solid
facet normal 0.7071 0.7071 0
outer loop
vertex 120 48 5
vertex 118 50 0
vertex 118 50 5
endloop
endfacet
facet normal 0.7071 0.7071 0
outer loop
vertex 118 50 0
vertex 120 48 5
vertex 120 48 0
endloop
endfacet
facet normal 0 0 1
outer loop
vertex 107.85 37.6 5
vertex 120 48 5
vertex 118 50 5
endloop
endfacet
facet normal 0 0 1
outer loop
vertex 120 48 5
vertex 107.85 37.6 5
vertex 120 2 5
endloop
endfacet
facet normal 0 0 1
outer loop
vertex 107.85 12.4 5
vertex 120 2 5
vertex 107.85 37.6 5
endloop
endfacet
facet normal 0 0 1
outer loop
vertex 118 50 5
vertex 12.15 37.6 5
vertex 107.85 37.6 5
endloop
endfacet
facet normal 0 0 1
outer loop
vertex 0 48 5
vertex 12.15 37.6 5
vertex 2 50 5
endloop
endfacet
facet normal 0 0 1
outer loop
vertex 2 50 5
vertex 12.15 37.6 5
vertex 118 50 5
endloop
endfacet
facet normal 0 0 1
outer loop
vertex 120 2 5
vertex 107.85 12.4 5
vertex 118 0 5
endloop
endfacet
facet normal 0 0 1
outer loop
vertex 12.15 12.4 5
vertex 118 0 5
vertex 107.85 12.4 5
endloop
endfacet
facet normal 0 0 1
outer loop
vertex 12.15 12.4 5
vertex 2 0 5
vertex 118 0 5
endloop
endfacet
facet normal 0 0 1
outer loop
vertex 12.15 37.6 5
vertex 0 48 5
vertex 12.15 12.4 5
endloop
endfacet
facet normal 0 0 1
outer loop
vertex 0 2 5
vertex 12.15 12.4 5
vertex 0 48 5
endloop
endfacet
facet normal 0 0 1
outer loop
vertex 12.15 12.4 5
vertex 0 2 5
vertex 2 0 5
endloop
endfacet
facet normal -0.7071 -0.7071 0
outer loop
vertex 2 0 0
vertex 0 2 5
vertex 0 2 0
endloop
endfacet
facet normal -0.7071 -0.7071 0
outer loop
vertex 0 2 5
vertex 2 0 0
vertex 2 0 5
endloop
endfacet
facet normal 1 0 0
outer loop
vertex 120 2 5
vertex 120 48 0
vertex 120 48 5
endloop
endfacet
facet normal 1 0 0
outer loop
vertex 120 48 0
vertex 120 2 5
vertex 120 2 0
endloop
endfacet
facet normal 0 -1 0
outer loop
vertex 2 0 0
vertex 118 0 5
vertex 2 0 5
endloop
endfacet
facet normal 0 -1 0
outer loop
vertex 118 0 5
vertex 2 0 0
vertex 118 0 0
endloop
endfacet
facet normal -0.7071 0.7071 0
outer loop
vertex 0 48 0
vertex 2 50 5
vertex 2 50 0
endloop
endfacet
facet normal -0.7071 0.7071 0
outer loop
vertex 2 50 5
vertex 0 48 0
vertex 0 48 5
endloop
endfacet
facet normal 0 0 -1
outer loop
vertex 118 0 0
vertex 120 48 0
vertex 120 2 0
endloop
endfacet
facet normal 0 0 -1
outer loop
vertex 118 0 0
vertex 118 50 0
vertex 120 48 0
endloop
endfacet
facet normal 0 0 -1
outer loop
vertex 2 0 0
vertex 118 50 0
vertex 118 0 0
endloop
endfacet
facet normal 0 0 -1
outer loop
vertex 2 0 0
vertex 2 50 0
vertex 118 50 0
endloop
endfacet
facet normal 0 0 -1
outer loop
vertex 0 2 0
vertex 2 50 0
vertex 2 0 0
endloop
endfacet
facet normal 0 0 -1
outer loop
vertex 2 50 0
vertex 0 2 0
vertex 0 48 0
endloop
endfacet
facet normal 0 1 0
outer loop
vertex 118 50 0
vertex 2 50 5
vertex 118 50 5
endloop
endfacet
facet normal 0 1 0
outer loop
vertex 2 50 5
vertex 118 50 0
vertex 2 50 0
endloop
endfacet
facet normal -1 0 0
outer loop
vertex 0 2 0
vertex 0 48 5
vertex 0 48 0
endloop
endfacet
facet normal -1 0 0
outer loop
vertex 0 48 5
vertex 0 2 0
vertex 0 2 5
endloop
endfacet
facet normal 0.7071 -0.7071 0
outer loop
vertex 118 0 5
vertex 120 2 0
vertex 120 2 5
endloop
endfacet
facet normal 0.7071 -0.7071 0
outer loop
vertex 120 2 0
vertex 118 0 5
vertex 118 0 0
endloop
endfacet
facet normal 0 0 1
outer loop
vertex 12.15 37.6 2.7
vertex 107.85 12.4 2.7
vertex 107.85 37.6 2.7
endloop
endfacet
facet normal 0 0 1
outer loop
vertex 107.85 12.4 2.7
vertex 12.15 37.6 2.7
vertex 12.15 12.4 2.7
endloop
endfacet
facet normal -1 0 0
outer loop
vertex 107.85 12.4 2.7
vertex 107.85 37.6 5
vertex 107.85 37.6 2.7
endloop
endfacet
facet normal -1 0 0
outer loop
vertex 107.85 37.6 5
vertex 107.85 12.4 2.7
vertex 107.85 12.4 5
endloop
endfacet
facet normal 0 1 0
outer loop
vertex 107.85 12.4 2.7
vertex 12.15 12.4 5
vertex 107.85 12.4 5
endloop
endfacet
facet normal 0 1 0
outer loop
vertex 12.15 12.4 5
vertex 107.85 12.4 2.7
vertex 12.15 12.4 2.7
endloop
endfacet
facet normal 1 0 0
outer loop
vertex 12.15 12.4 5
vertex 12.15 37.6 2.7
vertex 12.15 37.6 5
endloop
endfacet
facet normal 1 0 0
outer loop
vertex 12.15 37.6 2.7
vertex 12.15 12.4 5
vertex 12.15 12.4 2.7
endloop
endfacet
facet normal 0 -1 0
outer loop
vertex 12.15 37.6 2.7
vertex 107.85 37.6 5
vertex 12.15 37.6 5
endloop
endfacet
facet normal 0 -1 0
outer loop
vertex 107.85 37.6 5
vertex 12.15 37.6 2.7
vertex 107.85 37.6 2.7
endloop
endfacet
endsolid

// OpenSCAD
$fn = 32;

// ----------------------------------------------------------------------
// Windowed plate: 1 voids, 120 x 50 x 5 mm
// ----------------------------------------------------------------------

// --- parameters (mm) ---
plate_l = 120;            // plate length, X
plate_w = 50;             // plate width, Y
plate_t = 5;              // plate thickness, Z
edge_margin = 8;          // wall from the plate edge to any window
win1_l = 95.7;            // window length
win1_w = 25.2;            // window width
depth_1 = 2.3;            // depth of void 1 (full thickness = through)
corner_c = 2;             // corner chamfer of the plate

profile = [[2, 0], [118, 0], [120, 2], [120, 48], [118, 50], [2, 50], [0, 48], [0, 2]];  // primary outline, 8 points, counter clockwise
void_1 = [[12.15, 12.4], [107.85, 12.4], [107.85, 37.6], [12.15, 37.6]];  // large central window, 4 points

// --- the one profile operation ---
difference() {
  linear_extrude(height = plate_t) polygon(points = profile);
  translate([0, 0, plate_t - depth_1])
    linear_extrude(height = depth_1 + 1) polygon(points = void_1);
}
